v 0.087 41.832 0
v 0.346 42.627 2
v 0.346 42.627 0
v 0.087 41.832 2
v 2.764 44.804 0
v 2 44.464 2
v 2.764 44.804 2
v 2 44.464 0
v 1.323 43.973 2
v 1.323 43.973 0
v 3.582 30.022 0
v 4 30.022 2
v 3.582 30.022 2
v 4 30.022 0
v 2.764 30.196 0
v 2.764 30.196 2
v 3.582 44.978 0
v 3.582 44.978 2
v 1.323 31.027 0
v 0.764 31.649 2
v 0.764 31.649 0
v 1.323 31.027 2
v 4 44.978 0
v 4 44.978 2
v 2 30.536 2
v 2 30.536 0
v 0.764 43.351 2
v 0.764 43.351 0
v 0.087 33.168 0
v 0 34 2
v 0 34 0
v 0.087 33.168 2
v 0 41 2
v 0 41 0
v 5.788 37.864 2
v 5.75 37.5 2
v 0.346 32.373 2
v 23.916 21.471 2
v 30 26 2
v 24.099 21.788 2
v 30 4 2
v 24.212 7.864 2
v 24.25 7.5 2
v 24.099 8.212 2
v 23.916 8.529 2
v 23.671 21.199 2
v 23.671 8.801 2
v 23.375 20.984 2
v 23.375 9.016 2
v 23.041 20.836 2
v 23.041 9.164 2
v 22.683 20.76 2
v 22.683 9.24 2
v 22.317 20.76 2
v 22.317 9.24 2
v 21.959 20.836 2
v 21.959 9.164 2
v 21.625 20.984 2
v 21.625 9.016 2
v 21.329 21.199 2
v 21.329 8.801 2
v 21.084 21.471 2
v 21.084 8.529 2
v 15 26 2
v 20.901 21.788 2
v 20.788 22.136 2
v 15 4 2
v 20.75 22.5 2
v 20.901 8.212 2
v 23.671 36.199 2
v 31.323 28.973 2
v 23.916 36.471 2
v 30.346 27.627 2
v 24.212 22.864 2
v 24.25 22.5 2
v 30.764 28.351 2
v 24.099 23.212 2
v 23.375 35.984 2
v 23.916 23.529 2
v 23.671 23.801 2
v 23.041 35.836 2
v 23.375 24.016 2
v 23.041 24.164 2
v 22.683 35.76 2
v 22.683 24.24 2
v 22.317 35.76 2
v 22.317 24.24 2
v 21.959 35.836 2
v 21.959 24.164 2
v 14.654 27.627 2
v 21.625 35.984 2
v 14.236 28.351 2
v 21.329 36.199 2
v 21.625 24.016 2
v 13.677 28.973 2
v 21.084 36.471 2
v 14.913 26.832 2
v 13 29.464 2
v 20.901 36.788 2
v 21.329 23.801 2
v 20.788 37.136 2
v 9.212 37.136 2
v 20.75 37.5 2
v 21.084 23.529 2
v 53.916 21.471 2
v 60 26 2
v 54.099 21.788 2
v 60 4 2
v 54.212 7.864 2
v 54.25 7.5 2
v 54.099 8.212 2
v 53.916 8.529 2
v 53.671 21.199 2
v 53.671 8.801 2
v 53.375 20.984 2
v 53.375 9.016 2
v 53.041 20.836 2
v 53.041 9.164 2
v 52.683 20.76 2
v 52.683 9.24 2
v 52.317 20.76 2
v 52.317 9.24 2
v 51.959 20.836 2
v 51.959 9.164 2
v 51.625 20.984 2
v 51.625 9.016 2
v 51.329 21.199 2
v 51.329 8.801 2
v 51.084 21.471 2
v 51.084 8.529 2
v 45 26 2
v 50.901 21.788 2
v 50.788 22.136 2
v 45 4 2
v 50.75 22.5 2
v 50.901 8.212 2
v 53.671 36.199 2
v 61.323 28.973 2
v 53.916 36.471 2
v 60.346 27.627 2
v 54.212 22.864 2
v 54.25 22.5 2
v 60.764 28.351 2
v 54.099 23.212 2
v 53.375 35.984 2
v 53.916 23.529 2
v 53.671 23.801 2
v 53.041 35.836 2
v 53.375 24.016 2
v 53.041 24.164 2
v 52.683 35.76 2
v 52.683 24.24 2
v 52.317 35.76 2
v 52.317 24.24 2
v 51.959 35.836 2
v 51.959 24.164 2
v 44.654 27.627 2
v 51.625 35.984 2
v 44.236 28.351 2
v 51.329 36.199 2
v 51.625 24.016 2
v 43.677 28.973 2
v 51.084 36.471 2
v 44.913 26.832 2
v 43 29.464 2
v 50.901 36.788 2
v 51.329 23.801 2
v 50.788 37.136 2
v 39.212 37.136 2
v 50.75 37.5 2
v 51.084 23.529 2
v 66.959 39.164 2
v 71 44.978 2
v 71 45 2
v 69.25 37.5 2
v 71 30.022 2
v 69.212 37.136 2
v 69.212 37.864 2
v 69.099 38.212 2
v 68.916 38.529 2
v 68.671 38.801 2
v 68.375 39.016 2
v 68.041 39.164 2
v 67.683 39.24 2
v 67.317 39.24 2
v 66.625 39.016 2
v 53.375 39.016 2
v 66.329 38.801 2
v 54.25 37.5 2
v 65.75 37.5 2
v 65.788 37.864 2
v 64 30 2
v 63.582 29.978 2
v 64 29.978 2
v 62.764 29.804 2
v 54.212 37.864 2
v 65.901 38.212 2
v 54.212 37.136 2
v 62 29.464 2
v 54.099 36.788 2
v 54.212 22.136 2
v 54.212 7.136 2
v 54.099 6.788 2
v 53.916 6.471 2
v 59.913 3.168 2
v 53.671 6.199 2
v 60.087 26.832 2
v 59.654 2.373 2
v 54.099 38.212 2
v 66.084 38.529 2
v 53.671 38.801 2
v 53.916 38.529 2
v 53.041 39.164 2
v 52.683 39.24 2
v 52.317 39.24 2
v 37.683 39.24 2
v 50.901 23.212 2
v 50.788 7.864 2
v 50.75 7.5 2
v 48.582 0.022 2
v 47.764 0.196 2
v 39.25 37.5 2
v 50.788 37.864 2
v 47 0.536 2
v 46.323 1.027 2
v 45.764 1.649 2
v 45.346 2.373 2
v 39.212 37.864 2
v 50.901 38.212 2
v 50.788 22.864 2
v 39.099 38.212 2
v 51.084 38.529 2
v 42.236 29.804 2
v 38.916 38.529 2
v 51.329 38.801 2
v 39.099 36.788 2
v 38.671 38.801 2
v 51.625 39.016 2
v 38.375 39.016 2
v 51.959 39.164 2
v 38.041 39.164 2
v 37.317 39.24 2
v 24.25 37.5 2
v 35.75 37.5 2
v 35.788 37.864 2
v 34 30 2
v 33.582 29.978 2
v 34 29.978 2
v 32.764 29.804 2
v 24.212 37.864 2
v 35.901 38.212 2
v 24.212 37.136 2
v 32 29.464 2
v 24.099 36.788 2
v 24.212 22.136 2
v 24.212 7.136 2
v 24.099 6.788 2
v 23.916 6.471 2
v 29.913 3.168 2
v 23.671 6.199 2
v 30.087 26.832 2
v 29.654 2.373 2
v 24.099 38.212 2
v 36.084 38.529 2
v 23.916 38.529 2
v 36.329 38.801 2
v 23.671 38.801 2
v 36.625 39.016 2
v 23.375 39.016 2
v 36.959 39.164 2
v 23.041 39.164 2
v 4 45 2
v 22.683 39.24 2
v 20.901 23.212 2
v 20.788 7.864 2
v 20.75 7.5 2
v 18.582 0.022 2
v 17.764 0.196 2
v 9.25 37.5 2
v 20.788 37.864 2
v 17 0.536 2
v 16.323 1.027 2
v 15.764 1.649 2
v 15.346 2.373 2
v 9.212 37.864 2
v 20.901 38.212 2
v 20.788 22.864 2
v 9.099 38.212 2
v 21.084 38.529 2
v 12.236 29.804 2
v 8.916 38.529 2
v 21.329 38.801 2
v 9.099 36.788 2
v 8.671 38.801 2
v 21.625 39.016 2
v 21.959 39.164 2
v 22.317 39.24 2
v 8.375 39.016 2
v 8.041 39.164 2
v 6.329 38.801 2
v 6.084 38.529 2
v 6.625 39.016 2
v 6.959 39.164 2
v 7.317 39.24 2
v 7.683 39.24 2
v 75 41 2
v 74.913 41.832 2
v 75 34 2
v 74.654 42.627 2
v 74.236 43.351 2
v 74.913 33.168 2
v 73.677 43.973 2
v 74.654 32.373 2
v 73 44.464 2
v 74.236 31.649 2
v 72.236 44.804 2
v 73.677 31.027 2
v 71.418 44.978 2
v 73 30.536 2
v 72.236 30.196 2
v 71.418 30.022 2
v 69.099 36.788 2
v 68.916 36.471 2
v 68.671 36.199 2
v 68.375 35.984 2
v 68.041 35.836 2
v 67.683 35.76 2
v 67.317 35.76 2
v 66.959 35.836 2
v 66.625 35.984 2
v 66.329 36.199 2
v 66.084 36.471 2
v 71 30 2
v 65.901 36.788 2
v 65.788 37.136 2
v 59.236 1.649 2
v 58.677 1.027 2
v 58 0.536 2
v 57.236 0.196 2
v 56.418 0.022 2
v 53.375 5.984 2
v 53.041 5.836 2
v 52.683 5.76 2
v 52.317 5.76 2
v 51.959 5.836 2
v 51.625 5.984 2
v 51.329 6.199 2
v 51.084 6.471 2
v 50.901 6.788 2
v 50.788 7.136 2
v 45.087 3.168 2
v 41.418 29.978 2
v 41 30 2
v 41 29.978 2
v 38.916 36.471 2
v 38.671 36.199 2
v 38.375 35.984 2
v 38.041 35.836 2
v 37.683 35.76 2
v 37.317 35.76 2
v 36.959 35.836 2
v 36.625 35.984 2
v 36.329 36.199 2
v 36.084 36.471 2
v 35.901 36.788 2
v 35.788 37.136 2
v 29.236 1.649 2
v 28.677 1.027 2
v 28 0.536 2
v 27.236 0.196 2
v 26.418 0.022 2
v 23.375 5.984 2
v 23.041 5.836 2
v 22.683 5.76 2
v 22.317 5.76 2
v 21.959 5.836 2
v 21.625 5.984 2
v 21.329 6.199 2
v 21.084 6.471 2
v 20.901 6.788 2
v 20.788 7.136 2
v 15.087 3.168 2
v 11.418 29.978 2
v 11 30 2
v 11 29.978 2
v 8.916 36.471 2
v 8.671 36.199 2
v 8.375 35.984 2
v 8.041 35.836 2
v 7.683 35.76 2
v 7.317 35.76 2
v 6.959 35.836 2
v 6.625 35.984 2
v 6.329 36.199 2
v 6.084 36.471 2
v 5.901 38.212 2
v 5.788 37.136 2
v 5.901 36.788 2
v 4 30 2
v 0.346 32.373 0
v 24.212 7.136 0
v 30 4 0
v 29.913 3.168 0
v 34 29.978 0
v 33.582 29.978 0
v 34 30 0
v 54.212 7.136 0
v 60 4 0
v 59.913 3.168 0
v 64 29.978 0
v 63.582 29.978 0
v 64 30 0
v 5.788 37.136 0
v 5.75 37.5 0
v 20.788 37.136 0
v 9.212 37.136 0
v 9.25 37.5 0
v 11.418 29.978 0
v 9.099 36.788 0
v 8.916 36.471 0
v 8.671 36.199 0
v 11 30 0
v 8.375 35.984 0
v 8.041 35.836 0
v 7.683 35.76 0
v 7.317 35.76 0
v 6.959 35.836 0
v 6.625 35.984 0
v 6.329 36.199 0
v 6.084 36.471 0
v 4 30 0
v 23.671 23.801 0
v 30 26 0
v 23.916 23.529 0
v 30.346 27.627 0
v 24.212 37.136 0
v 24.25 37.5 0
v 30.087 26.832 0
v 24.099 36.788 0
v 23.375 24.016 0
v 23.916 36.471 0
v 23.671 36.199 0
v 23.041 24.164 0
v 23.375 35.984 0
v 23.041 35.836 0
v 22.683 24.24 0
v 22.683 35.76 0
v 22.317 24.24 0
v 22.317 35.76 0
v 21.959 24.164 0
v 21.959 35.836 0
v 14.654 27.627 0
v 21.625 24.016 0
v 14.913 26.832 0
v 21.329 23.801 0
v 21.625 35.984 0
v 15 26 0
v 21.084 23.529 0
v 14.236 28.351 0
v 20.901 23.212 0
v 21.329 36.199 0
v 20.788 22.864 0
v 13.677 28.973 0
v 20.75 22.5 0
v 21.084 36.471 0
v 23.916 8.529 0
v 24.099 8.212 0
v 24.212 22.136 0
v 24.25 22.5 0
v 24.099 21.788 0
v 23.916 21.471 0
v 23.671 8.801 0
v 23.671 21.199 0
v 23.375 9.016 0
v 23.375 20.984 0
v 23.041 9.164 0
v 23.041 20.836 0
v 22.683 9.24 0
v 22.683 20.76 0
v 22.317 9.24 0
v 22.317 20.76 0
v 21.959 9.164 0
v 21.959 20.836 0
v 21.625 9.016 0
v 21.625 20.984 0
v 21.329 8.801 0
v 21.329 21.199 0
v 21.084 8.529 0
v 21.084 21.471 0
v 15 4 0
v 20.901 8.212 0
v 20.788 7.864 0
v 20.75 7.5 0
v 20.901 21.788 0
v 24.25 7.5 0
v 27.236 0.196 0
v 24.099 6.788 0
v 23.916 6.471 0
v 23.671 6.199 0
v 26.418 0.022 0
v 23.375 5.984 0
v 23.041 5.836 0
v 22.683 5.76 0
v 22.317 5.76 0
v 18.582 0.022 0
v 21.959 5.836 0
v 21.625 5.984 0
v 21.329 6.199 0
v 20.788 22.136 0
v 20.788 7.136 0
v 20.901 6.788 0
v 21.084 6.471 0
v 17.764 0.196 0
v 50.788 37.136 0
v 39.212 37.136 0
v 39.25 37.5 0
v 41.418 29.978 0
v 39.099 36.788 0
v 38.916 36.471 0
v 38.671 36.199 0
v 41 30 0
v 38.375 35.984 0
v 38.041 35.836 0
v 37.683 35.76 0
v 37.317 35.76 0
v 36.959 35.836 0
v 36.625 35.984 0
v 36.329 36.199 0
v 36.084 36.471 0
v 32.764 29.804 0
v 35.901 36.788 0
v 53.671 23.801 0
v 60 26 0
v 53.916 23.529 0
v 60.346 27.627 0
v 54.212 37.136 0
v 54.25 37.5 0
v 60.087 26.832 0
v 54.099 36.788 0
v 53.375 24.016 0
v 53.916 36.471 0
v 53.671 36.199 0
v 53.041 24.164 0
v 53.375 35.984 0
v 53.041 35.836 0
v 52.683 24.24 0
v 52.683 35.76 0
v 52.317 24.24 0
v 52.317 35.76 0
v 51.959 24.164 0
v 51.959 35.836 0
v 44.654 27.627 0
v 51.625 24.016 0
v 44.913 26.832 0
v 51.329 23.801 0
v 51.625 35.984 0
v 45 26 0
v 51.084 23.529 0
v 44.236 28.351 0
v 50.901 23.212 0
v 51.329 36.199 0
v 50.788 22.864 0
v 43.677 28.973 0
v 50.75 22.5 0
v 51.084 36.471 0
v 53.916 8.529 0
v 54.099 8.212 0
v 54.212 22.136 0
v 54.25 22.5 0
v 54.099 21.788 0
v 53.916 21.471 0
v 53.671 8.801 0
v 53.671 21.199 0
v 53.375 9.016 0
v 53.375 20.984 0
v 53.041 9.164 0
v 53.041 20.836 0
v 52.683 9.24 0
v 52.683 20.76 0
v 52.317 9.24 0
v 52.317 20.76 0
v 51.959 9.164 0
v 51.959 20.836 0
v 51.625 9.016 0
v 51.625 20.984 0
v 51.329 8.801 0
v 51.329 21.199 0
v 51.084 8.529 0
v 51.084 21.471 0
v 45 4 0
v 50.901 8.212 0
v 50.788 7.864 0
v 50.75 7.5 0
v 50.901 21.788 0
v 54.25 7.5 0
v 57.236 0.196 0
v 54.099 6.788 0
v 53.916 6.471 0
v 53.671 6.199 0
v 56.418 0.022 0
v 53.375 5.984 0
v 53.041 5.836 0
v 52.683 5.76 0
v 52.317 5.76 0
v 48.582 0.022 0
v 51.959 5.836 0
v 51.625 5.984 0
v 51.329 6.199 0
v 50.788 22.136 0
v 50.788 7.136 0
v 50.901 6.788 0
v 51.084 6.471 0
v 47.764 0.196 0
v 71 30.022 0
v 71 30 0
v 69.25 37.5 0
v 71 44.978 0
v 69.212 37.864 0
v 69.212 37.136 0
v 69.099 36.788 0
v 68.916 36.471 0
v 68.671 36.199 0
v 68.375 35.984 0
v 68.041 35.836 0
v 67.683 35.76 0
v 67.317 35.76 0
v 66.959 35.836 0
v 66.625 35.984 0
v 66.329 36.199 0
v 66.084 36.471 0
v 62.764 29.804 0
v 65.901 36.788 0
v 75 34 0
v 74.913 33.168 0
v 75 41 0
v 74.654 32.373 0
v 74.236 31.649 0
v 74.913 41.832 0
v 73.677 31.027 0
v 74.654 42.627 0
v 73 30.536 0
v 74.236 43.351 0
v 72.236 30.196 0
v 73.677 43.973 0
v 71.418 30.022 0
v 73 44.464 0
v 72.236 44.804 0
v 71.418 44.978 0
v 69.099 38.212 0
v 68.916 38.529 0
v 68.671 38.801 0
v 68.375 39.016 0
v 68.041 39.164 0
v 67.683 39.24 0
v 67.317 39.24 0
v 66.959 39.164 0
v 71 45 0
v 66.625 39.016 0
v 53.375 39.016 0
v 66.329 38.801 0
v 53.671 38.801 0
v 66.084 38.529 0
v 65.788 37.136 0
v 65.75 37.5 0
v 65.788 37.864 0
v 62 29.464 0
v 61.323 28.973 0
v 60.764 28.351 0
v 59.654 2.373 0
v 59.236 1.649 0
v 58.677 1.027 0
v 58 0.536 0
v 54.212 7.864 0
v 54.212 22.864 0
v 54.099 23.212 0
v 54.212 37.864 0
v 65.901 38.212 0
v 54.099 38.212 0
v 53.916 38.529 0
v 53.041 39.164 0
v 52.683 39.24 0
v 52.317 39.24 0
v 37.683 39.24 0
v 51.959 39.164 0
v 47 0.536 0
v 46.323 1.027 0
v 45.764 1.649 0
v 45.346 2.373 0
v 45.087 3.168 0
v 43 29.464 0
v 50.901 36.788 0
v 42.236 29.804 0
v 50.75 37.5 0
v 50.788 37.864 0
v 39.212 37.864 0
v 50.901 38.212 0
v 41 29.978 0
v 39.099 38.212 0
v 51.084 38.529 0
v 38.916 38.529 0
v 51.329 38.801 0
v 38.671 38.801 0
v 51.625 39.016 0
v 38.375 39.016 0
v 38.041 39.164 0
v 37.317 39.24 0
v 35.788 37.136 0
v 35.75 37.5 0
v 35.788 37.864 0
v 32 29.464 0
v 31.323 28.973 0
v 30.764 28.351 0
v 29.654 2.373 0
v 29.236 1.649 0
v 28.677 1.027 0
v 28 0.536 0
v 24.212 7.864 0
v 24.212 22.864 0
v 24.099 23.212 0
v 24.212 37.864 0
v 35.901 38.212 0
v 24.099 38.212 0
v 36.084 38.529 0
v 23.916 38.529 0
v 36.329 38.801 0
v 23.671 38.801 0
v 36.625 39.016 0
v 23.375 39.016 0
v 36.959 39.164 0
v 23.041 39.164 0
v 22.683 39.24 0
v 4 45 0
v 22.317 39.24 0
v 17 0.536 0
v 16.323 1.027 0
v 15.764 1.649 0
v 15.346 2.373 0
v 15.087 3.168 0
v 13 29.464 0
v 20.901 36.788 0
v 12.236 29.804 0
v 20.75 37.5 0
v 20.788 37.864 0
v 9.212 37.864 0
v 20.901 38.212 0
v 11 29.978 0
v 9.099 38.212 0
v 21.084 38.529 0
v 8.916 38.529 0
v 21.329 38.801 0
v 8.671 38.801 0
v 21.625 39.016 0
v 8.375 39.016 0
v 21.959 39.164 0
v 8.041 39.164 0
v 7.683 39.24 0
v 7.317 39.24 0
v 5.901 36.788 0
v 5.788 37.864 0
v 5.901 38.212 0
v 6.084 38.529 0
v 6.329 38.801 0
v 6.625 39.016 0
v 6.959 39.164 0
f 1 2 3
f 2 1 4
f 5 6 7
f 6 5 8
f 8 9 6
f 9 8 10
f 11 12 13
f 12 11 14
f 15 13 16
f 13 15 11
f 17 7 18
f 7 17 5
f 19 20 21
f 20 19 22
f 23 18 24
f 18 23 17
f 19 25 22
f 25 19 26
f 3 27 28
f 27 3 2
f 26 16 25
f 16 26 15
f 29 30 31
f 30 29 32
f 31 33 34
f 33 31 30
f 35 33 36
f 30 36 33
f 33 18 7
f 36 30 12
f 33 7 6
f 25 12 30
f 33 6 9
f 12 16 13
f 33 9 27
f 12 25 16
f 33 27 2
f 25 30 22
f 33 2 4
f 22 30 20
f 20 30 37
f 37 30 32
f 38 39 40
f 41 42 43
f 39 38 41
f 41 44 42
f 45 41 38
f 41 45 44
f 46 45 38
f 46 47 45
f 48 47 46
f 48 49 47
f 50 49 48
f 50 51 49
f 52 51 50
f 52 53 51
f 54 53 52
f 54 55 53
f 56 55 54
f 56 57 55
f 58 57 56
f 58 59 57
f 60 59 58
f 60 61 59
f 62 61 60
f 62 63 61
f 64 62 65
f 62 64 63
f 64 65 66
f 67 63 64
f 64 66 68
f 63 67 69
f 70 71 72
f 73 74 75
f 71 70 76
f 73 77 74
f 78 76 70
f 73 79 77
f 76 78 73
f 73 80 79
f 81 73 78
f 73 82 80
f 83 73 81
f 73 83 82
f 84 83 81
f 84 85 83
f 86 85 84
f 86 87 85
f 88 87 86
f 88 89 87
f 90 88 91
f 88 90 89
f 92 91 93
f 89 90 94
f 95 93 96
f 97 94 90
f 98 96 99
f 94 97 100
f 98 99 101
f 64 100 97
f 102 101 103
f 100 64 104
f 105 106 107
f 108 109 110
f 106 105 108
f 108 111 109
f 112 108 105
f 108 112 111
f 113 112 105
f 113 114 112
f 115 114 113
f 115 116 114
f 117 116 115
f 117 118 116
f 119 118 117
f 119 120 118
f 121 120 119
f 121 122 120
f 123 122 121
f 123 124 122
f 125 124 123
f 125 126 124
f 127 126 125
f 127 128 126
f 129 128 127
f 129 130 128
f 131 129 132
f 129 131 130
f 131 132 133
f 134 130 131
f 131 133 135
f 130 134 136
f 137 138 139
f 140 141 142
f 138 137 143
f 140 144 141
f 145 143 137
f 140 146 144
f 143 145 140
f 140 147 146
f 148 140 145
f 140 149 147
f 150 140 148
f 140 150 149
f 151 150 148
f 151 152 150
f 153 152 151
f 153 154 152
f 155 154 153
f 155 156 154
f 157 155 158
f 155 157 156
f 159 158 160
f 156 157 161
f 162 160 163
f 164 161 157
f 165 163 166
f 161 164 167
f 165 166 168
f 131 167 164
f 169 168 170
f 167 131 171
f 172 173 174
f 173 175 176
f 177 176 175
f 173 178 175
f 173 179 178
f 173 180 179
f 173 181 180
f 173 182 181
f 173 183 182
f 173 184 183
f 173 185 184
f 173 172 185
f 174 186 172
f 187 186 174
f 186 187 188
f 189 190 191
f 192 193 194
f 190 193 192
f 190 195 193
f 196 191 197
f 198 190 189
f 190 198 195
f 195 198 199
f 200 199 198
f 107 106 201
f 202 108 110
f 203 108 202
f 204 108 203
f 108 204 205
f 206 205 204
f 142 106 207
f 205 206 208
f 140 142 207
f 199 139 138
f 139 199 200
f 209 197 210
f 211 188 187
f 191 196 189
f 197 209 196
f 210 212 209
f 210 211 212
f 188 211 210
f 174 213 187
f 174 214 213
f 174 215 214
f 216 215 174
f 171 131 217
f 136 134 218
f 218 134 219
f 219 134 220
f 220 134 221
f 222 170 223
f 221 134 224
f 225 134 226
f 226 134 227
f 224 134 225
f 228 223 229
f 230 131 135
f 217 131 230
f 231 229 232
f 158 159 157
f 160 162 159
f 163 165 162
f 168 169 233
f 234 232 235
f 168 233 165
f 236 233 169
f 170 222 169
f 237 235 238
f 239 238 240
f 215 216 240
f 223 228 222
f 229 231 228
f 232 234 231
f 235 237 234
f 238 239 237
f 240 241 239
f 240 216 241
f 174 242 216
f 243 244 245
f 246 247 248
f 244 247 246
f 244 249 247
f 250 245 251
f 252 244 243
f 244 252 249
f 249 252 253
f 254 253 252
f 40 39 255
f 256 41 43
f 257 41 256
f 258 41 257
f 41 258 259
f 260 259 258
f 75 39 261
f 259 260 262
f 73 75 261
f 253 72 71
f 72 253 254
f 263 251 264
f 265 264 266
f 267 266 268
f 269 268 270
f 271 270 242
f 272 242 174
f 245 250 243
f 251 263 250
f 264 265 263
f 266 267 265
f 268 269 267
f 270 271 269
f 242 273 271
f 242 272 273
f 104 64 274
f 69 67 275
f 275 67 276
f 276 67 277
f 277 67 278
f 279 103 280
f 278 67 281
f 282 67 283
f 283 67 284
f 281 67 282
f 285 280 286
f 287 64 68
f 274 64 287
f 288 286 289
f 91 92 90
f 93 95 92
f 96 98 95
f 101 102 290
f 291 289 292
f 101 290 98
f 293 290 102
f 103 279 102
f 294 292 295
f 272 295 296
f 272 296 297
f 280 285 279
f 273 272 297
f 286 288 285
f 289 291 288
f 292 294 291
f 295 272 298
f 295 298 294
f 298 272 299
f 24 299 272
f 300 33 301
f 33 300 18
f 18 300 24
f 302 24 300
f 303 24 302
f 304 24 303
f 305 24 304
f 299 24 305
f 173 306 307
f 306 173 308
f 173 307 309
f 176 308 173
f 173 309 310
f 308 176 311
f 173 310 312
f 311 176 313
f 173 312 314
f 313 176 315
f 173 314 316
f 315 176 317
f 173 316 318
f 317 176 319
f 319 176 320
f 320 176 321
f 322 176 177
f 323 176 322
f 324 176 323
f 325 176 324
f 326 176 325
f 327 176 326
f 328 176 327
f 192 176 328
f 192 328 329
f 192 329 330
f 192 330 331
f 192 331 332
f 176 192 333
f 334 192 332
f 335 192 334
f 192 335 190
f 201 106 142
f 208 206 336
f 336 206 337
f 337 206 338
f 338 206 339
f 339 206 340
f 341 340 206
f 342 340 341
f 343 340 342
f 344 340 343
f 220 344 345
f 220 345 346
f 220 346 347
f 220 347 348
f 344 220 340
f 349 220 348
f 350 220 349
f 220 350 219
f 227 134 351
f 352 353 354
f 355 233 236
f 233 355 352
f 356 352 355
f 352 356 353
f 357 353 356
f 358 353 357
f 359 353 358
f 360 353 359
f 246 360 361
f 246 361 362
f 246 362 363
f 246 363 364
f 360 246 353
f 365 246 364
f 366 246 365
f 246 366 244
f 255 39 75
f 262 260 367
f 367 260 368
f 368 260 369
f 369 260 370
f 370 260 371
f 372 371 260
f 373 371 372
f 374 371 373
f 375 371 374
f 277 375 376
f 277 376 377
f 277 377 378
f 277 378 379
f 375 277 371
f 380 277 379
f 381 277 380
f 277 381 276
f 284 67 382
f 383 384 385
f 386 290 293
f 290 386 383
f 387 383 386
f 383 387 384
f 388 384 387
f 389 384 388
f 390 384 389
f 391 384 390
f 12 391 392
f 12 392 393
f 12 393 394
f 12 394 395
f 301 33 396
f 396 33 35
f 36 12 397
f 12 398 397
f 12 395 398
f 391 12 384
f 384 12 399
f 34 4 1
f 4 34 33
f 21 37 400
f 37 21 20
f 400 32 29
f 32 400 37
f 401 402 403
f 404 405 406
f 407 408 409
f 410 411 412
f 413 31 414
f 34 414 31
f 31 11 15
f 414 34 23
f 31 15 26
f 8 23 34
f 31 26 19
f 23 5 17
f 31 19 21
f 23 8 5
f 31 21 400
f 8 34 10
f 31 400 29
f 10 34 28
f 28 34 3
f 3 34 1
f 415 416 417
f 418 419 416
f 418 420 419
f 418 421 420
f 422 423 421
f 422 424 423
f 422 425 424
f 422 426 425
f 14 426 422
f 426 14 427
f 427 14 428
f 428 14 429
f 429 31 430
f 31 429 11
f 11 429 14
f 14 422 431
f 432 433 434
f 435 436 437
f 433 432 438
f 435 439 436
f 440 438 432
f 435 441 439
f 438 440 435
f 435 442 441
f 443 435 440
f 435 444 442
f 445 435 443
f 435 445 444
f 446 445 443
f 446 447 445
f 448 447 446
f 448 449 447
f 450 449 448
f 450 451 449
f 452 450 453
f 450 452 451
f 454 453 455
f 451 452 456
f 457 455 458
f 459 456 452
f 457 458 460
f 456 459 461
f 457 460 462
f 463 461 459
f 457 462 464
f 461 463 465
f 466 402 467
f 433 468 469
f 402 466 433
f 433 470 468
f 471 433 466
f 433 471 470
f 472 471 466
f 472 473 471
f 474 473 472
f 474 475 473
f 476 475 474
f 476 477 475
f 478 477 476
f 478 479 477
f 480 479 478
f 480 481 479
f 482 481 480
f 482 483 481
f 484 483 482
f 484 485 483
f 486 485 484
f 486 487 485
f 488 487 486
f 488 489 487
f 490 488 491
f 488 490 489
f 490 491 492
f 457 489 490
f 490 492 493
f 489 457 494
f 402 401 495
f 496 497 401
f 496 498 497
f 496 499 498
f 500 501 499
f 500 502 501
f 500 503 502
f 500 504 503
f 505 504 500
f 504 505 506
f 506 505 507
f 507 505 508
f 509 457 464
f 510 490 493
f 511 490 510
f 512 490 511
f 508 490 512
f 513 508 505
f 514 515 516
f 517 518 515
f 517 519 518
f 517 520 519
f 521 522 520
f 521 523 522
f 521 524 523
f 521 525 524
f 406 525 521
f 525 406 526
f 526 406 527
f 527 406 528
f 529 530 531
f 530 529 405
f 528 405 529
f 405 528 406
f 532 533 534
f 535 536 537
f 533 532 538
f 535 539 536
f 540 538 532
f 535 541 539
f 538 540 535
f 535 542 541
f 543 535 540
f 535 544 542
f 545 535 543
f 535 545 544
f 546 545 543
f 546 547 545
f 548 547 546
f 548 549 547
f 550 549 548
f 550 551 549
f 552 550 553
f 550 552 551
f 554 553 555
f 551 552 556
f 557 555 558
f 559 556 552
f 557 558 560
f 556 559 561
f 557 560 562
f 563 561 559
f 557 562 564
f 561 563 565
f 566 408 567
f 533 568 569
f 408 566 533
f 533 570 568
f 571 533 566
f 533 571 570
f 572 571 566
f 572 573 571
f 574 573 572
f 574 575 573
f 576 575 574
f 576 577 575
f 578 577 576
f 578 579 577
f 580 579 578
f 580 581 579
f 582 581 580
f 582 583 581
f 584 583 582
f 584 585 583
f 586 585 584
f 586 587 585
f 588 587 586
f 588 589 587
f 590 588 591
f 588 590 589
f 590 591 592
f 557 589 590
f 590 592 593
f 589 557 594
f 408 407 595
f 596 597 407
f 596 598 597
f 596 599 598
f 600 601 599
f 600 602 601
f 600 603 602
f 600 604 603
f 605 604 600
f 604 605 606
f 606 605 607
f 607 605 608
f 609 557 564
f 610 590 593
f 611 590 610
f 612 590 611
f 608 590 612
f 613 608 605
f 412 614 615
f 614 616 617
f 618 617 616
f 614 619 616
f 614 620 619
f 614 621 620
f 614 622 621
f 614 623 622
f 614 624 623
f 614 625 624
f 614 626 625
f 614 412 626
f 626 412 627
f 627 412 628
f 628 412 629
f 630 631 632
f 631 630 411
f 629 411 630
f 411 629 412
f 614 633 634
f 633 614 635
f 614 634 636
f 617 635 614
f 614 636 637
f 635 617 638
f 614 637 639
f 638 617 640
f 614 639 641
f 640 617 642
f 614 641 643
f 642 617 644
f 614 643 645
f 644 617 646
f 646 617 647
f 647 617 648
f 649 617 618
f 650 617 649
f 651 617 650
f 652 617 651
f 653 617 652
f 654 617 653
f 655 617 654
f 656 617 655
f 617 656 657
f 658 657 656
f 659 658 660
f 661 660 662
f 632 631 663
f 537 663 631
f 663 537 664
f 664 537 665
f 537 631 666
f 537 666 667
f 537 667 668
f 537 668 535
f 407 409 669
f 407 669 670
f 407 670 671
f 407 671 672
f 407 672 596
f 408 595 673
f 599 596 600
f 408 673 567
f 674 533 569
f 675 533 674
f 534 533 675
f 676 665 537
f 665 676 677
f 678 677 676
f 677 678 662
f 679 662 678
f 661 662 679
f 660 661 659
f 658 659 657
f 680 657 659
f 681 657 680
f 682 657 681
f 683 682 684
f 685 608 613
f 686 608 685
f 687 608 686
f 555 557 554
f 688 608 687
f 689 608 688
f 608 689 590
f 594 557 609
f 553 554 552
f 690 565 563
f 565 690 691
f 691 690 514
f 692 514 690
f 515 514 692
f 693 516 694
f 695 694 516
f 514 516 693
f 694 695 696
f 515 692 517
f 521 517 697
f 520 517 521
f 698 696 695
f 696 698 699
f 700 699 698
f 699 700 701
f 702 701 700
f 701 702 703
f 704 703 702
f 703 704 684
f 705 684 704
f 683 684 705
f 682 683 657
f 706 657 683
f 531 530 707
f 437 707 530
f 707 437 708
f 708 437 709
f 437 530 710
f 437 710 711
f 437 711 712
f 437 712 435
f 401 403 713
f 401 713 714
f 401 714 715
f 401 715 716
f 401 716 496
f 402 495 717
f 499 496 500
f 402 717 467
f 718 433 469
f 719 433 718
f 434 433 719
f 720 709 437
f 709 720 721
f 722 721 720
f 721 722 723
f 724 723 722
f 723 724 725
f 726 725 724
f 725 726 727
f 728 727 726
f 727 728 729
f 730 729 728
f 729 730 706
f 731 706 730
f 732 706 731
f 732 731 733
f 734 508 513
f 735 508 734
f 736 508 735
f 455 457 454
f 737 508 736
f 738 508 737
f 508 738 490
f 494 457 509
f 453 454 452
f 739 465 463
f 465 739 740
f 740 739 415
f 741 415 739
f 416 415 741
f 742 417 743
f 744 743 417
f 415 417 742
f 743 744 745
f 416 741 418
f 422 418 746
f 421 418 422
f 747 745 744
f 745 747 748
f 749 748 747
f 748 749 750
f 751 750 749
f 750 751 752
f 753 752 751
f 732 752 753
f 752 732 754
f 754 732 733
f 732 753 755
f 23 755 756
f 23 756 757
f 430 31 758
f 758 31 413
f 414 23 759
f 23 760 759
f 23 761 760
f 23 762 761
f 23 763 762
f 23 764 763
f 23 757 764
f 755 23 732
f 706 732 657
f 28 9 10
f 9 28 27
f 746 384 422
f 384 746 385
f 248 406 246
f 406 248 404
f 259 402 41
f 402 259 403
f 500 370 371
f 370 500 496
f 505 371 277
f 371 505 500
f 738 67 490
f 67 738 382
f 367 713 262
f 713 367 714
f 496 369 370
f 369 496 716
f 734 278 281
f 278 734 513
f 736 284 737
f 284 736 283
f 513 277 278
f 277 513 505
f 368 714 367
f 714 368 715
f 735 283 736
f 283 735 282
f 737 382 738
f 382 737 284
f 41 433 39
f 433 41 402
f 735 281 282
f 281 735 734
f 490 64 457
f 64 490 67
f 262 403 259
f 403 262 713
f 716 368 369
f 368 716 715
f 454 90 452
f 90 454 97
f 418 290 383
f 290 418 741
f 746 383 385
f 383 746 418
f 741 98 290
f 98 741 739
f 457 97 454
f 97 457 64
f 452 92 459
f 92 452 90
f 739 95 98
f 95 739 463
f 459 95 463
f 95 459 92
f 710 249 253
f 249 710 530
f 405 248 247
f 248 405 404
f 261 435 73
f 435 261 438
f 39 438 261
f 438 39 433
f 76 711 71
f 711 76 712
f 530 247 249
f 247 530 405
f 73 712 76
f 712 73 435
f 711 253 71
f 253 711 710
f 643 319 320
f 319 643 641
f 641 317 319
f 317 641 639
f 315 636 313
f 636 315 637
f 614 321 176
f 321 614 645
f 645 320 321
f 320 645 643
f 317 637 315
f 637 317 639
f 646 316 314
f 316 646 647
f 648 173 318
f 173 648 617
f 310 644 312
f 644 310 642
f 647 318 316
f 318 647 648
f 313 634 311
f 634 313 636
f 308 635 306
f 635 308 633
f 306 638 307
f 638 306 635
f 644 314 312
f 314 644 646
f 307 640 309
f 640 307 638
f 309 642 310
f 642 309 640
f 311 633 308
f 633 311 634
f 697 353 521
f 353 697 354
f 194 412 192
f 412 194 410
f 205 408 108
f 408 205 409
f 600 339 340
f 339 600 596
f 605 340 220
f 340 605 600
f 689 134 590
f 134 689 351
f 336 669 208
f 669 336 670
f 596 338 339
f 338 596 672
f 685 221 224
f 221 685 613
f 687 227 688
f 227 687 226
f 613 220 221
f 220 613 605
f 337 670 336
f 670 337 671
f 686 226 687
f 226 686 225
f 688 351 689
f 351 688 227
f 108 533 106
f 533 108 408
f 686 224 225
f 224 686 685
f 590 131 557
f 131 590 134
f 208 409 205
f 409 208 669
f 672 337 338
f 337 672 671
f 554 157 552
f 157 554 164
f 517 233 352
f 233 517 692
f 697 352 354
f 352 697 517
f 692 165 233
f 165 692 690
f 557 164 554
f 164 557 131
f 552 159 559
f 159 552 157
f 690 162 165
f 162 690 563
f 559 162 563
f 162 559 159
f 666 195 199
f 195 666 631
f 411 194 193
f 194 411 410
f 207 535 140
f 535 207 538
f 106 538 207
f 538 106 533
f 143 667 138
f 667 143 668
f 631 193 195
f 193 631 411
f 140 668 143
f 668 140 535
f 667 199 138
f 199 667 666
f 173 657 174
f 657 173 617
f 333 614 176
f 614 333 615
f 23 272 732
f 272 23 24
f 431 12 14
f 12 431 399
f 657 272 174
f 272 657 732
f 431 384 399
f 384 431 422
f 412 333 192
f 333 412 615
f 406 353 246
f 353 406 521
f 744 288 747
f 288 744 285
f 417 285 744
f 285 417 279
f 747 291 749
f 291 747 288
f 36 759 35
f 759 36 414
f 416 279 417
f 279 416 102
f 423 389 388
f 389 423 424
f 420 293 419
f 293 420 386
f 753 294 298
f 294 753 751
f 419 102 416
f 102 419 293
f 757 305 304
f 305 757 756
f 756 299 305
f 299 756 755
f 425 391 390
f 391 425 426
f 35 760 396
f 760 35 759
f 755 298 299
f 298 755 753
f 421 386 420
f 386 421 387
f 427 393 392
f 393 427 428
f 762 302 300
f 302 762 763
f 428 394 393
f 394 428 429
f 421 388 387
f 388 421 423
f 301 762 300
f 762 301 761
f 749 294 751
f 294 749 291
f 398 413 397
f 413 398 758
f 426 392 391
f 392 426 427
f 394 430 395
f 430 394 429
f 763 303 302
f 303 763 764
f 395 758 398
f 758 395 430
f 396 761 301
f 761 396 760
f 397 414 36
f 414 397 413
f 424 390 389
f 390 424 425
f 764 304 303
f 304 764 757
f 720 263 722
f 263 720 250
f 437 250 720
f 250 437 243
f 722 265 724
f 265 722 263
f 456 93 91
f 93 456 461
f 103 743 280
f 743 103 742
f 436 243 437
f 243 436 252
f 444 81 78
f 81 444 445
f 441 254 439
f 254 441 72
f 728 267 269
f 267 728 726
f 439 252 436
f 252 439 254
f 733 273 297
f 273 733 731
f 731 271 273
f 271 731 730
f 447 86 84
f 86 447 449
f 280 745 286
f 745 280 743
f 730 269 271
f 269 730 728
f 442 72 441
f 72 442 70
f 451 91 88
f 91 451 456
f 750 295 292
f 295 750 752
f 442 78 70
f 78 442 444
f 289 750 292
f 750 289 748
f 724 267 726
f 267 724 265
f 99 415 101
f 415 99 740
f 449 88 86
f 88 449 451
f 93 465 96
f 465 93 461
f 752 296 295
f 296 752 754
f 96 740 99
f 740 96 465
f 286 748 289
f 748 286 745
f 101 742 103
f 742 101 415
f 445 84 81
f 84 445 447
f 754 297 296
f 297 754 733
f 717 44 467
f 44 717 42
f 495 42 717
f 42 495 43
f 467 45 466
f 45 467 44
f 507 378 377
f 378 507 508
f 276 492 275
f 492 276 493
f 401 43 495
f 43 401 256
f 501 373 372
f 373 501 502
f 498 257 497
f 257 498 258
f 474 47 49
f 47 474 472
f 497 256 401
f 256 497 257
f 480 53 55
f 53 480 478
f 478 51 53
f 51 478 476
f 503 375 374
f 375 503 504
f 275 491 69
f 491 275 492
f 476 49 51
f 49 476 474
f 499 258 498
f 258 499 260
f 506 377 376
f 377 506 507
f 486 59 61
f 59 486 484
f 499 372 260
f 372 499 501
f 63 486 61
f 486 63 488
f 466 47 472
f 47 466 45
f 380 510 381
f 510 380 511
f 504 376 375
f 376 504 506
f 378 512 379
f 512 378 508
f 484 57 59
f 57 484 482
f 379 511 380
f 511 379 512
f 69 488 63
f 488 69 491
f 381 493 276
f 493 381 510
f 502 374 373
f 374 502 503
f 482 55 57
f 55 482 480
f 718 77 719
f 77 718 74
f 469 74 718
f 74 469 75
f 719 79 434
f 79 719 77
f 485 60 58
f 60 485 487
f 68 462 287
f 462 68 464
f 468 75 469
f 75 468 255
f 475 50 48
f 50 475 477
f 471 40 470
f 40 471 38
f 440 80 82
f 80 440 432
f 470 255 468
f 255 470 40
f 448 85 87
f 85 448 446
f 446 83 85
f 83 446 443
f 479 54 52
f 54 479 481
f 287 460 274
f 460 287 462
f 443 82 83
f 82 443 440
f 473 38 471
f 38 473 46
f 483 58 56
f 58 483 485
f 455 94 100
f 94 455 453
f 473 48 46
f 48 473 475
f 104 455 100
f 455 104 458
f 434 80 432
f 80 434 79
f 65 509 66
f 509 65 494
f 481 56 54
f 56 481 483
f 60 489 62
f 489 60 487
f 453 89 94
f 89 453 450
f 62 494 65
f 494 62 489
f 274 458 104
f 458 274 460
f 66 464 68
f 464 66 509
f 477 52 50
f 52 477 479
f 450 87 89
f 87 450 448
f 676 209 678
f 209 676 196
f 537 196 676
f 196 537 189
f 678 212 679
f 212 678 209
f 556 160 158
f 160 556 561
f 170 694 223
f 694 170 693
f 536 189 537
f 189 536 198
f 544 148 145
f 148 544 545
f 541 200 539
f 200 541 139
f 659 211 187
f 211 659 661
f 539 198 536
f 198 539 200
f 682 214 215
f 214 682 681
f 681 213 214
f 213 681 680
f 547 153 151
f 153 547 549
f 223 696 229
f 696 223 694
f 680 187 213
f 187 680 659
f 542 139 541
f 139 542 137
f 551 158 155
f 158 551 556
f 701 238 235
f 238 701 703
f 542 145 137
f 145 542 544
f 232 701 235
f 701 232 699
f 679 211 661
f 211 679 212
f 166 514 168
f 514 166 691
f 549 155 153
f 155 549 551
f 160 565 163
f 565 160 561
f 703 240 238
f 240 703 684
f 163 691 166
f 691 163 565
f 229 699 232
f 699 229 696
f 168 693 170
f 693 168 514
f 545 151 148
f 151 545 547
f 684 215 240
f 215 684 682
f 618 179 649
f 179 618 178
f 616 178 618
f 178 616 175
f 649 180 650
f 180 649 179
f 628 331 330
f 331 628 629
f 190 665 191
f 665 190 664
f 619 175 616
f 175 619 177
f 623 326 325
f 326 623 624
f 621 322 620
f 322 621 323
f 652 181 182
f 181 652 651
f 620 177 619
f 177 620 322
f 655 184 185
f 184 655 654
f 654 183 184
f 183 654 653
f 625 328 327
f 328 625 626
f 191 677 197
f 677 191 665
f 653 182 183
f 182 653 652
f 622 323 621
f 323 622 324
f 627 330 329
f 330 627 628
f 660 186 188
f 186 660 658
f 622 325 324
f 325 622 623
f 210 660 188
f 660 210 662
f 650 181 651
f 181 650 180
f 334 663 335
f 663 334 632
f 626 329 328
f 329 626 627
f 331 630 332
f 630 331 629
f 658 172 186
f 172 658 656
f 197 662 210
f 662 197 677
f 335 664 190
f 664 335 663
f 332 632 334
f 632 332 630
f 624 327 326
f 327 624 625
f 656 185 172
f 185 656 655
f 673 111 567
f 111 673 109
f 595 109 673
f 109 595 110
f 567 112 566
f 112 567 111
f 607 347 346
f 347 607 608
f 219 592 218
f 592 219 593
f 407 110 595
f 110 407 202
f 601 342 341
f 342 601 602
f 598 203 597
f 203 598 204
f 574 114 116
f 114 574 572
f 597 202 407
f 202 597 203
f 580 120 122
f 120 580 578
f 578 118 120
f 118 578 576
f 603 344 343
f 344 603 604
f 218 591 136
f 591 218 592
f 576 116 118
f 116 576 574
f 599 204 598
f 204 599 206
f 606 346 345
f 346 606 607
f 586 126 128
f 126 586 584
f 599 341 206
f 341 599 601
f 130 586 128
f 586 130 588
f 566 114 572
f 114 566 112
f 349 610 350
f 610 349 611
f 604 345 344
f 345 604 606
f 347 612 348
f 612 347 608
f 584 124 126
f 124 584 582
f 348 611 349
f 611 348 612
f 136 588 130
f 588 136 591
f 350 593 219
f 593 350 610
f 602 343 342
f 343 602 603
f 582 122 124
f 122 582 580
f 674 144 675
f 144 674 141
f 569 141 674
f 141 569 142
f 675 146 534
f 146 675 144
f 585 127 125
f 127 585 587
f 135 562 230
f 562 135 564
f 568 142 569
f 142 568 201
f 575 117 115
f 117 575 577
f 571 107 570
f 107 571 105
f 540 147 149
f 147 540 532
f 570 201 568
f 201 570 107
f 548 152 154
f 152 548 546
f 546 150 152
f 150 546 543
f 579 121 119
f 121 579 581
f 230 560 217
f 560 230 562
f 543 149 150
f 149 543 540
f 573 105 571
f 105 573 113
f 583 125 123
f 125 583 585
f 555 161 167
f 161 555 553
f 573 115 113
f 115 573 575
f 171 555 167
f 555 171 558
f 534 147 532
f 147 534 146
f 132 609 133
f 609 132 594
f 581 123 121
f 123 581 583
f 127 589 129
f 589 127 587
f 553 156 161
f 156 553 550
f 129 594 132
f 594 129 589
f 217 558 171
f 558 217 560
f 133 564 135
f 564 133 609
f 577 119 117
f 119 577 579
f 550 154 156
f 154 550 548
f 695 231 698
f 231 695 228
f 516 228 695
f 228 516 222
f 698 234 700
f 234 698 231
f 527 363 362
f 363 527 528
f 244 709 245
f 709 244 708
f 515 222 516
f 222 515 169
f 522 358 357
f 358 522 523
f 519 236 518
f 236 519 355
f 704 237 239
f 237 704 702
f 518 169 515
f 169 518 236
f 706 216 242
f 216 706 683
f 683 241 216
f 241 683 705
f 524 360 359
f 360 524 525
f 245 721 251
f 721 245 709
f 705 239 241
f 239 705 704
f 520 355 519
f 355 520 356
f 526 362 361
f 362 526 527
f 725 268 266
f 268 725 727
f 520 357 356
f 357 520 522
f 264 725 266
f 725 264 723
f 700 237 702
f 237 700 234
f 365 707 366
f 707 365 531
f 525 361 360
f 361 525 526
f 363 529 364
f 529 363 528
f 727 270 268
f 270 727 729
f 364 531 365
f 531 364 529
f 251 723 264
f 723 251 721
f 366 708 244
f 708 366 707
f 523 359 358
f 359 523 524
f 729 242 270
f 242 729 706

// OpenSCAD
//spacing between T centers
spacing = 30;
//15mm for misumi and Openbeam
ext_size = 15; 
//thickness of piece
thickness = 2;

m3_hole = 3.5;
corner_radius = 4;

difference() {
  union() {
    difference() {
      union() {
        T();
        translate([spacing,0,0]) T();
        translate([corner_radius,ext_size*2])
        cube([ext_size*3+spacing-corner_radius*2,ext_size,thickness]);
      }
      T_holes();
      translate([spacing,0,0]) T_holes();
    }
    translate([spacing/2+ext_size*1.5,ext_size*2.5,thickness/2])
    if(spacing<37) {
      cylinder(d=ext_size-m3_hole,h=thickness,center=true);
    }
  }
  translate([spacing/2+ext_size*1.5,ext_size*2.5,thickness/2])
  cylinder(d=m3_hole,h=3*thickness,center=true,$fn=30);
}

module T_holes(){
  for (ii = [ext_size/2:ext_size:3*ext_size]) {
    translate([ii,2.5*ext_size ,0 ])
    cylinder(d=m3_hole,h=thickness*3,center=true,$fn=30);
  }
  for (ii = [ext_size/2:ext_size:3*ext_size]) {
    translate([1.5*ext_size,ii ,0 ])
    cylinder(d=m3_hole,h=thickness*3,center=true,$fn=30);
  }
}
module T() {
  difference() {
    union() {
      translate([0,2*ext_size] )
      v_rounded_cube([3*ext_size,ext_size,thickness],corner_radius);
      translate([(ext_size - corner_radius),corner_radius,0])
      v_rounded_cube([ext_size+corner_radius*2,ext_size*3-corner_radius,thickness],corner_radius);
      translate([(ext_size ),0,0])
      v_rounded_cube([ext_size,ext_size*3,thickness],corner_radius);
    }

    translate([-corner_radius,-corner_radius ])
    v_rounded_cube([ext_size+corner_radius,ext_size*2+corner_radius,thickness],corner_radius);
    translate([2*ext_size,-corner_radius ])
    v_rounded_cube([ext_size+corner_radius,ext_size*2+corner_radius,thickness],corner_radius);
  }
}


module v_rounded_cube(xyz,r,$fn=30) {
  z = xyz[2];
  y = xyz[1];
  x = xyz[0];
  translate([r,r])
  hull() {
    cylinder(h=z,r=r);
    translate([0,y-2*r])
    cylinder(h=z,r=r);
    translate([x-2*r,0])
    cylinder(h=z,r=r);
    translate([x-2*r,y-2*r])
    cylinder(h=z,r=r);
  }
}
